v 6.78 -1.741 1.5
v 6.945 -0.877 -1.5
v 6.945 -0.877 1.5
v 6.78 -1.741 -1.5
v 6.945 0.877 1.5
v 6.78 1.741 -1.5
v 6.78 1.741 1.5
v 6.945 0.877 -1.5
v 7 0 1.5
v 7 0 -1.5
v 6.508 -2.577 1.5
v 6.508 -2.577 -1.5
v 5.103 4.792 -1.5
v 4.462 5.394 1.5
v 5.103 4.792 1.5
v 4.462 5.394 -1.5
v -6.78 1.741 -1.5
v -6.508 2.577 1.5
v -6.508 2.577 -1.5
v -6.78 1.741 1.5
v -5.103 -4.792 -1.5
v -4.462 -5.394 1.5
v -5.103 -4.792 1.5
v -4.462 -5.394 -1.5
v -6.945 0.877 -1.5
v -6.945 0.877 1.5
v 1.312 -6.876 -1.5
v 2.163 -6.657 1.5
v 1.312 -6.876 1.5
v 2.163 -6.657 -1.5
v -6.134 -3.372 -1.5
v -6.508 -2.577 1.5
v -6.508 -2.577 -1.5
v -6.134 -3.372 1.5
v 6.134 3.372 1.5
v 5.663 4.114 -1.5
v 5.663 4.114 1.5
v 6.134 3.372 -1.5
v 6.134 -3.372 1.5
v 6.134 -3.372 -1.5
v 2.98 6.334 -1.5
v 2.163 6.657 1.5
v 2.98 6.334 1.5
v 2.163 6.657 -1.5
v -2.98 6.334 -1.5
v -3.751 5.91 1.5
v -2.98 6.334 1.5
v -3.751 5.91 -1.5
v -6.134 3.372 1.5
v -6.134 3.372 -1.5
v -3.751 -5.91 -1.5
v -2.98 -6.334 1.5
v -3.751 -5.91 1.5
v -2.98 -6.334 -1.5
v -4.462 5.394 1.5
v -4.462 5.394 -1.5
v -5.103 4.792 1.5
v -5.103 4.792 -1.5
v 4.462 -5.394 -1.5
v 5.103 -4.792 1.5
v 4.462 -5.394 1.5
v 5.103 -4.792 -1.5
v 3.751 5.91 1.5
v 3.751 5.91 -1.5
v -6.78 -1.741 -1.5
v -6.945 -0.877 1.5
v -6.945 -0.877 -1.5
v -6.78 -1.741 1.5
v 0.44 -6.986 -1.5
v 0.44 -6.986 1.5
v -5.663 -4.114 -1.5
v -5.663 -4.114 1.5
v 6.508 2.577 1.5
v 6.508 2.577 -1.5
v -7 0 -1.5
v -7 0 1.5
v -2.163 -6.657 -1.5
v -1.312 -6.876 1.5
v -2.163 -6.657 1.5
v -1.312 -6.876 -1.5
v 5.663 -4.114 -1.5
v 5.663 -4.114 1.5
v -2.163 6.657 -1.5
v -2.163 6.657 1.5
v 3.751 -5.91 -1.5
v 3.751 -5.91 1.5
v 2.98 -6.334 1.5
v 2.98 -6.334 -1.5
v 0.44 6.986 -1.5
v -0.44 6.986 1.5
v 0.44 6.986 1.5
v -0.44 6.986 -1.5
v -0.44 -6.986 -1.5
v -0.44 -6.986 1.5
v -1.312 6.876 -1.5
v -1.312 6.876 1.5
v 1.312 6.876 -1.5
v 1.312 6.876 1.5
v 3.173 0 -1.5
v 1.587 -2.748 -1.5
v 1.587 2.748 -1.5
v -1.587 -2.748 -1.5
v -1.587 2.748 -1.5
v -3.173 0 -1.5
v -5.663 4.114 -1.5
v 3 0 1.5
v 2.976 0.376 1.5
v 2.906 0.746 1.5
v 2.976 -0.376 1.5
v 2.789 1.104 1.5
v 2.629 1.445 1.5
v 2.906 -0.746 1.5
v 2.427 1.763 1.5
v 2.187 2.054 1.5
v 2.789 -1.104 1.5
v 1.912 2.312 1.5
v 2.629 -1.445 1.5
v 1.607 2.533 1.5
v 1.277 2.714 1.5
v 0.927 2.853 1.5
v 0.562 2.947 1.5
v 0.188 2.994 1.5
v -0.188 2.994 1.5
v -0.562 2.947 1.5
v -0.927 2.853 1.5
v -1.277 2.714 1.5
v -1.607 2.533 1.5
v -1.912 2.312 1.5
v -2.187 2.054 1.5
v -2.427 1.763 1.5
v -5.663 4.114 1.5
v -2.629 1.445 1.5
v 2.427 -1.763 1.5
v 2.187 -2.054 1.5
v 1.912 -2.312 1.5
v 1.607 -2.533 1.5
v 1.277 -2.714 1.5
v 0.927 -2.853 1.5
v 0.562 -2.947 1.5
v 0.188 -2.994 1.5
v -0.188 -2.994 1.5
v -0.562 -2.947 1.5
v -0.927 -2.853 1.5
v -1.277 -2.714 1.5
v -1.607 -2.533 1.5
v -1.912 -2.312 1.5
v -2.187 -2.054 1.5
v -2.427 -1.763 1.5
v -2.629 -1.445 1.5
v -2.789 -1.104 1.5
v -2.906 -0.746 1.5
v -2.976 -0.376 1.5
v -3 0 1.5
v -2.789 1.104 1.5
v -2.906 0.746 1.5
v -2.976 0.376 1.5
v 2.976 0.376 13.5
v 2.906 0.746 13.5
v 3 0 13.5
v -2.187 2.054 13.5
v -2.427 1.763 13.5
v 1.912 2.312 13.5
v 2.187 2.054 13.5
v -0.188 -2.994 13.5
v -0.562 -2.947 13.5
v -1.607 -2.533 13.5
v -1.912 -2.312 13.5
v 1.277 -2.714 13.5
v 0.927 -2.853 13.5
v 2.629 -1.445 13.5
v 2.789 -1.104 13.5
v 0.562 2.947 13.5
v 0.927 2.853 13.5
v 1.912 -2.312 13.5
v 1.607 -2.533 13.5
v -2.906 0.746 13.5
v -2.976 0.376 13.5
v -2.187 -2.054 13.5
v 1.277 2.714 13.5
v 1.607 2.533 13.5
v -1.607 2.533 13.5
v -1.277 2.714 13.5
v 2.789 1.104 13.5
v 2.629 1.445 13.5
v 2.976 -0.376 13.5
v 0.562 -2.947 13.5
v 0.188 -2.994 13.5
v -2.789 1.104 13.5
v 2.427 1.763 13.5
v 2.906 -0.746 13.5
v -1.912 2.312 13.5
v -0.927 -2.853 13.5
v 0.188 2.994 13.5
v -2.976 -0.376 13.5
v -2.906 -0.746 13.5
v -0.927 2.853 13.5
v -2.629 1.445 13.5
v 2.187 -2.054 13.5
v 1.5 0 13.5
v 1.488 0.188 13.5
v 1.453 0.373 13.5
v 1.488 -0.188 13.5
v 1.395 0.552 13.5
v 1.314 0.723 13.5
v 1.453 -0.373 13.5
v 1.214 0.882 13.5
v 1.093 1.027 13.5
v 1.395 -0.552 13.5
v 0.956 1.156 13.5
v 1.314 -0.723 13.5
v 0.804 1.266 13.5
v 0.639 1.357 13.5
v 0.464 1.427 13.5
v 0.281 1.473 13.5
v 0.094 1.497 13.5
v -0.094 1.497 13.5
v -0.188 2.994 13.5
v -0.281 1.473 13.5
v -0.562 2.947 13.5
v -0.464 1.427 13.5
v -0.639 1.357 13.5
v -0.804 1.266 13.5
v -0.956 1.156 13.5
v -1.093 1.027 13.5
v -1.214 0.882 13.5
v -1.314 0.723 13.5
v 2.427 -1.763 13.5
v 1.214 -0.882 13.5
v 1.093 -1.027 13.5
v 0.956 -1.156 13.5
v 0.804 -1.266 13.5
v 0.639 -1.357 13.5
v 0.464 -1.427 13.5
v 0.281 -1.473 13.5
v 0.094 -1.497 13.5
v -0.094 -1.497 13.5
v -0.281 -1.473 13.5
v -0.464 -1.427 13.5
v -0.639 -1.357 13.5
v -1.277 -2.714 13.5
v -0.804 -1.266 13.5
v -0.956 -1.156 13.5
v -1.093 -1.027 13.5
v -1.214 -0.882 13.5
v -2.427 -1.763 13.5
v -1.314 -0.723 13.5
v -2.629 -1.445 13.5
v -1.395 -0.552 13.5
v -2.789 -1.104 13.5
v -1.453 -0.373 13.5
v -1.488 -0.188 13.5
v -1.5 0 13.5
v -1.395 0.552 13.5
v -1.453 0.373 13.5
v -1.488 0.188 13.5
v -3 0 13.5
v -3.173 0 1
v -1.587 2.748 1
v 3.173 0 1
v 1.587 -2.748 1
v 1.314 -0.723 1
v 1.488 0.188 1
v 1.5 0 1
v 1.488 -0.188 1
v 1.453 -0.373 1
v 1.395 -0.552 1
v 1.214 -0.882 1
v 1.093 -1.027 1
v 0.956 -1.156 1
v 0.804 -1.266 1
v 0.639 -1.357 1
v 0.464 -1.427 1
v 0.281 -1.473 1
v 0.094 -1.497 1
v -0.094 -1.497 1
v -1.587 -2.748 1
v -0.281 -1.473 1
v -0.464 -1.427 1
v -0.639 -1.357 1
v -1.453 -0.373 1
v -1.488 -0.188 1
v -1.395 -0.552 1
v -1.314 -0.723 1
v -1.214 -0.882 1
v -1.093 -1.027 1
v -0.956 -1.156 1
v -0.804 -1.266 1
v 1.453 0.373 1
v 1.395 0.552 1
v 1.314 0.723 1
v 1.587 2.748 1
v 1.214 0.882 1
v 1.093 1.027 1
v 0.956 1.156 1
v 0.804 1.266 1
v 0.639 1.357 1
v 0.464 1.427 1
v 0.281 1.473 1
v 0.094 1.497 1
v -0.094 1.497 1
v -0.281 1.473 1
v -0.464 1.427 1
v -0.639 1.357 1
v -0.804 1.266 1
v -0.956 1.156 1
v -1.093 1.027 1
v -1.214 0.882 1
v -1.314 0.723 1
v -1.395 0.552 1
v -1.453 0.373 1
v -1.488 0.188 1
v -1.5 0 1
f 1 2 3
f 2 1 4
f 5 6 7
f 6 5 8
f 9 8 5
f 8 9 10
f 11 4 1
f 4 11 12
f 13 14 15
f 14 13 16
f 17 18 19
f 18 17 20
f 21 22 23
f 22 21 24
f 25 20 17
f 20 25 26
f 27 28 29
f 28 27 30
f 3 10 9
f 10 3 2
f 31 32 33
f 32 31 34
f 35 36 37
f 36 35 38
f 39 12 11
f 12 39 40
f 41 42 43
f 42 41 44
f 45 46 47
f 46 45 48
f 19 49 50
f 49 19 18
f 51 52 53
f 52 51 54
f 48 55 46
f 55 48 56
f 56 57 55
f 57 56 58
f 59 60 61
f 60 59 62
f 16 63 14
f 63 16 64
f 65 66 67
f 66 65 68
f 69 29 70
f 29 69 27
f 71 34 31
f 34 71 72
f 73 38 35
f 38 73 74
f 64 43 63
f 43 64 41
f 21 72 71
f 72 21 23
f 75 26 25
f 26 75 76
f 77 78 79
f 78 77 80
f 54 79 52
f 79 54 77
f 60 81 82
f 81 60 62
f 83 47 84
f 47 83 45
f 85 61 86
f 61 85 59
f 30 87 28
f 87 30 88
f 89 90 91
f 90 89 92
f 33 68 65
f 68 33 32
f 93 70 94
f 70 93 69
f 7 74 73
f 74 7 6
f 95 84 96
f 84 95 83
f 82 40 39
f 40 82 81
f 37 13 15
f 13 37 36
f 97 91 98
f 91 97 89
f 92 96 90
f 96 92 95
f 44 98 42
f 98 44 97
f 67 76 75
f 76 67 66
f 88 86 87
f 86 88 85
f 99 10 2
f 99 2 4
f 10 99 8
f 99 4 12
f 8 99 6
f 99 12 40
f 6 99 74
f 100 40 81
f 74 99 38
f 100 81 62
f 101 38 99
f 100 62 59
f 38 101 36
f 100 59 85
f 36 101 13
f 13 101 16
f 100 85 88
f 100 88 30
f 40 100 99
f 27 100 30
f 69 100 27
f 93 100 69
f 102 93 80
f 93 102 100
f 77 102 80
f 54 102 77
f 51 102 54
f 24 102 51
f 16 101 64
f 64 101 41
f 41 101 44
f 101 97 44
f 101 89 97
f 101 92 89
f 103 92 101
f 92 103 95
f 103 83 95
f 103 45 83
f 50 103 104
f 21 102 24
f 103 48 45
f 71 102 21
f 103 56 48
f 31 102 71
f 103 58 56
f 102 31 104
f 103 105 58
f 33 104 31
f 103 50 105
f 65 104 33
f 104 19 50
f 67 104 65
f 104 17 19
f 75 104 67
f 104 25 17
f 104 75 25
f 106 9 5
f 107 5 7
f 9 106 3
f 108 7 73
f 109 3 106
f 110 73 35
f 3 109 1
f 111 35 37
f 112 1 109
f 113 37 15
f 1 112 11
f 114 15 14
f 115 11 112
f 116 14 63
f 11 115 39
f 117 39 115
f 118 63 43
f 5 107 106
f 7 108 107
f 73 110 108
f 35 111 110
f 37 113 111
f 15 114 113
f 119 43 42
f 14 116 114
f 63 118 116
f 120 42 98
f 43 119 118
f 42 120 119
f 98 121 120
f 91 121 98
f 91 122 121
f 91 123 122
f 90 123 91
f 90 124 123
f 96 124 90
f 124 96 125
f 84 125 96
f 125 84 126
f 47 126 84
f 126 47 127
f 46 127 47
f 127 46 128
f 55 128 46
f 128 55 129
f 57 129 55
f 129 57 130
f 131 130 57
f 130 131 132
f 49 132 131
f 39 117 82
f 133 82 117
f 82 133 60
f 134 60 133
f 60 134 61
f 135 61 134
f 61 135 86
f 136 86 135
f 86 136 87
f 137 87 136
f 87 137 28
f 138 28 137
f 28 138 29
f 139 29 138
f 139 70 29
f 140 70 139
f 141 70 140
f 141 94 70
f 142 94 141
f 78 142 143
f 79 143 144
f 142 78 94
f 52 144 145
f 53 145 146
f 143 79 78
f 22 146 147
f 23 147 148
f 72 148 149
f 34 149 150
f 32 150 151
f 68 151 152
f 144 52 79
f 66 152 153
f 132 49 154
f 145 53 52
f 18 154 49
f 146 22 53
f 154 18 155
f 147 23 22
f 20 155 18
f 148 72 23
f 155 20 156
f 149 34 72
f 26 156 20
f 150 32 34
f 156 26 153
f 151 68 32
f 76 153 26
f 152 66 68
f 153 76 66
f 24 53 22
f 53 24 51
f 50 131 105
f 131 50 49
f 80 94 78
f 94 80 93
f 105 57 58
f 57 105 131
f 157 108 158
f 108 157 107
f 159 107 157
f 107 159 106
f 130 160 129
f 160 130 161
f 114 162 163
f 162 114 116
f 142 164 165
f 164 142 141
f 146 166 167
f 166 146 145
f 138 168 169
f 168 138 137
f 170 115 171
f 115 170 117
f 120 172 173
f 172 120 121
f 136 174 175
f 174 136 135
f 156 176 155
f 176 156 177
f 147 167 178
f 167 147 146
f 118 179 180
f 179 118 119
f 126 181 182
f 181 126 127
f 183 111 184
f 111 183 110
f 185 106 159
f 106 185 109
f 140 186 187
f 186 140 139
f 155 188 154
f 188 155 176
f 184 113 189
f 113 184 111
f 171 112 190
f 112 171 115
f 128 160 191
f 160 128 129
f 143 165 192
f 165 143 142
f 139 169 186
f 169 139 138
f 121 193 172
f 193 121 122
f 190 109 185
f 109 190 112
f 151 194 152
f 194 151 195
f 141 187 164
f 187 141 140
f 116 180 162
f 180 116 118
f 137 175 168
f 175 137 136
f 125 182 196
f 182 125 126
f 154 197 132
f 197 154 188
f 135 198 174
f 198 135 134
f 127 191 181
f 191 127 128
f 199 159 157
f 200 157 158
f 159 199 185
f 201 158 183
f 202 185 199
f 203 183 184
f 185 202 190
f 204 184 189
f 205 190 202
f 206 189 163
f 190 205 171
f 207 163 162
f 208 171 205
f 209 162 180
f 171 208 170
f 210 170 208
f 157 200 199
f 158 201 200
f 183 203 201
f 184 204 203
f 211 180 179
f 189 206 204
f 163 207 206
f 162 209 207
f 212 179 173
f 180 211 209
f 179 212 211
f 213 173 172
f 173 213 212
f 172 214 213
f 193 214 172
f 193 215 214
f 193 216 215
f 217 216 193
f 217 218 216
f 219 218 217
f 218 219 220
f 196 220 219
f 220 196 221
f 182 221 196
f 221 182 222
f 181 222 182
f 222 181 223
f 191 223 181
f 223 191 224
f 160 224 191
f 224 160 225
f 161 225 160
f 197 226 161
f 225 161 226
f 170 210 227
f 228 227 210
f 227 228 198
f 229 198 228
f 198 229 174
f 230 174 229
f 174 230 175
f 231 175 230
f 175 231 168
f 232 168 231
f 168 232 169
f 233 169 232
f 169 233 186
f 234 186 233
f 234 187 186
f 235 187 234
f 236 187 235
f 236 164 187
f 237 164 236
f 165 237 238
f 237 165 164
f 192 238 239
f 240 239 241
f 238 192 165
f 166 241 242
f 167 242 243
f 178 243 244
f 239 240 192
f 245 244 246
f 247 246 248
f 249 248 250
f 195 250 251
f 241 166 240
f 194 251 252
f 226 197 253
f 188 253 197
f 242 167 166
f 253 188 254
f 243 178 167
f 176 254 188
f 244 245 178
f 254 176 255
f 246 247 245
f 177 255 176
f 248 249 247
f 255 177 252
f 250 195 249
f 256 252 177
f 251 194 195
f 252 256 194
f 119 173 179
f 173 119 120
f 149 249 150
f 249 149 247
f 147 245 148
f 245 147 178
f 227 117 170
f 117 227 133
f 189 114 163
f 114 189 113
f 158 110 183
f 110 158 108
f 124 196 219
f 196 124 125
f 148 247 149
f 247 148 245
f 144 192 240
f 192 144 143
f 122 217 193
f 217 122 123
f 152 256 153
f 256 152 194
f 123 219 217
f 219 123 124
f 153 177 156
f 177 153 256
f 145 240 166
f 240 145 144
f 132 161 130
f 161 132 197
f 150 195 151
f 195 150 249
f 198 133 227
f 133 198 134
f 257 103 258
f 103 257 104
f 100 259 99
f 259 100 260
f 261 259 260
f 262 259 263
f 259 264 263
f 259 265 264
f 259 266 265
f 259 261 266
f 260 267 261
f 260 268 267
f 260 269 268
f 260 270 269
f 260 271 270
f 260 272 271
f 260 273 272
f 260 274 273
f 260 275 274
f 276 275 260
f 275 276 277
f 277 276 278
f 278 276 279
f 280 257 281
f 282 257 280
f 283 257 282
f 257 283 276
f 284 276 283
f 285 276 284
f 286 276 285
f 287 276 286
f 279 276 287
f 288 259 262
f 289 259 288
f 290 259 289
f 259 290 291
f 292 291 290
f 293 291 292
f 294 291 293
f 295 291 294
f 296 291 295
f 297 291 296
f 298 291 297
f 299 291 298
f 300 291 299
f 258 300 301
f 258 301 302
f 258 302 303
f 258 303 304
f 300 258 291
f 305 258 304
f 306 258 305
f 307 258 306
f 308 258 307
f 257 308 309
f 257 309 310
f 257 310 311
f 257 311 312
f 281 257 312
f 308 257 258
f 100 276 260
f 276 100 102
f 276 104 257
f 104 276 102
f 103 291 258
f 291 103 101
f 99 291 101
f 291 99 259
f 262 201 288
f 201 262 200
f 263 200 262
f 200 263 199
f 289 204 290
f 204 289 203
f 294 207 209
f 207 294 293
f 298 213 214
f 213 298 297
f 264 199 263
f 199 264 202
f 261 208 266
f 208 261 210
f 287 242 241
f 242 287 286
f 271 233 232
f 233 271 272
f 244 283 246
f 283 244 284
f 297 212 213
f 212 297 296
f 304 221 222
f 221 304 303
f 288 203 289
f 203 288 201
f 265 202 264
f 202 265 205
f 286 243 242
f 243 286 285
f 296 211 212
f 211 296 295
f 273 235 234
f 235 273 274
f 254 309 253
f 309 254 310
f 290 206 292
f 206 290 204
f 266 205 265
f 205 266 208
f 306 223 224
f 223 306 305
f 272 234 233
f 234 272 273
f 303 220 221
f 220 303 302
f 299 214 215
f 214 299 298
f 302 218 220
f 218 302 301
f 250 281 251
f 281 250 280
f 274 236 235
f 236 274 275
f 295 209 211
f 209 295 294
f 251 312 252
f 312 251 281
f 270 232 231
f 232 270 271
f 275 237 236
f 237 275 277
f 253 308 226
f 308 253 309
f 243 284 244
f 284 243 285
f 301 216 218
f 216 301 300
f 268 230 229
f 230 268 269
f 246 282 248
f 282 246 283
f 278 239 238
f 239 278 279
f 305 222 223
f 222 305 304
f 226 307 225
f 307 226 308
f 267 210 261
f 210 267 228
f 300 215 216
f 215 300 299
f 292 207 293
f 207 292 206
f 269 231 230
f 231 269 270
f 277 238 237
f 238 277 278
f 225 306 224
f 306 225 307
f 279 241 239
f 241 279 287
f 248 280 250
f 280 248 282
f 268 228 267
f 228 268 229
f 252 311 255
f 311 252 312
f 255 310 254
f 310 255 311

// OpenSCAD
$fn = 50;


difference() {
	union() {
		translate(v = [0, 0, -1.5000000000]) {
			cylinder(h = 3, r = 7.0000000000);
		}
		translate(v = [0, 0, -1.5000000000]) {
			cylinder(h = 15, r = 3.0000000000);
		}
	}
	union() {
		translate(v = [0, 0, -1.5000000000]) {
			rotate(a = [0, 0, 0]) {
				difference() {
					union() {
						#linear_extrude(height = 2.5000000000) {
							polygon(points = [[3.1735000000, 0.0000000000], [1.5867500000, 2.7483316189], [-1.5867500000, 2.7483316189], [-3.1735000000, 0.0000000000], [-1.5867500000, -2.7483316189], [1.5867500000, -2.7483316189]]);
						}
					}
					union();
				}
			}
		}
		translate(v = [0, 0, -50.0000000000]) {
			cylinder(h = 100, r = 1.5000000000);
		}
	}
}
